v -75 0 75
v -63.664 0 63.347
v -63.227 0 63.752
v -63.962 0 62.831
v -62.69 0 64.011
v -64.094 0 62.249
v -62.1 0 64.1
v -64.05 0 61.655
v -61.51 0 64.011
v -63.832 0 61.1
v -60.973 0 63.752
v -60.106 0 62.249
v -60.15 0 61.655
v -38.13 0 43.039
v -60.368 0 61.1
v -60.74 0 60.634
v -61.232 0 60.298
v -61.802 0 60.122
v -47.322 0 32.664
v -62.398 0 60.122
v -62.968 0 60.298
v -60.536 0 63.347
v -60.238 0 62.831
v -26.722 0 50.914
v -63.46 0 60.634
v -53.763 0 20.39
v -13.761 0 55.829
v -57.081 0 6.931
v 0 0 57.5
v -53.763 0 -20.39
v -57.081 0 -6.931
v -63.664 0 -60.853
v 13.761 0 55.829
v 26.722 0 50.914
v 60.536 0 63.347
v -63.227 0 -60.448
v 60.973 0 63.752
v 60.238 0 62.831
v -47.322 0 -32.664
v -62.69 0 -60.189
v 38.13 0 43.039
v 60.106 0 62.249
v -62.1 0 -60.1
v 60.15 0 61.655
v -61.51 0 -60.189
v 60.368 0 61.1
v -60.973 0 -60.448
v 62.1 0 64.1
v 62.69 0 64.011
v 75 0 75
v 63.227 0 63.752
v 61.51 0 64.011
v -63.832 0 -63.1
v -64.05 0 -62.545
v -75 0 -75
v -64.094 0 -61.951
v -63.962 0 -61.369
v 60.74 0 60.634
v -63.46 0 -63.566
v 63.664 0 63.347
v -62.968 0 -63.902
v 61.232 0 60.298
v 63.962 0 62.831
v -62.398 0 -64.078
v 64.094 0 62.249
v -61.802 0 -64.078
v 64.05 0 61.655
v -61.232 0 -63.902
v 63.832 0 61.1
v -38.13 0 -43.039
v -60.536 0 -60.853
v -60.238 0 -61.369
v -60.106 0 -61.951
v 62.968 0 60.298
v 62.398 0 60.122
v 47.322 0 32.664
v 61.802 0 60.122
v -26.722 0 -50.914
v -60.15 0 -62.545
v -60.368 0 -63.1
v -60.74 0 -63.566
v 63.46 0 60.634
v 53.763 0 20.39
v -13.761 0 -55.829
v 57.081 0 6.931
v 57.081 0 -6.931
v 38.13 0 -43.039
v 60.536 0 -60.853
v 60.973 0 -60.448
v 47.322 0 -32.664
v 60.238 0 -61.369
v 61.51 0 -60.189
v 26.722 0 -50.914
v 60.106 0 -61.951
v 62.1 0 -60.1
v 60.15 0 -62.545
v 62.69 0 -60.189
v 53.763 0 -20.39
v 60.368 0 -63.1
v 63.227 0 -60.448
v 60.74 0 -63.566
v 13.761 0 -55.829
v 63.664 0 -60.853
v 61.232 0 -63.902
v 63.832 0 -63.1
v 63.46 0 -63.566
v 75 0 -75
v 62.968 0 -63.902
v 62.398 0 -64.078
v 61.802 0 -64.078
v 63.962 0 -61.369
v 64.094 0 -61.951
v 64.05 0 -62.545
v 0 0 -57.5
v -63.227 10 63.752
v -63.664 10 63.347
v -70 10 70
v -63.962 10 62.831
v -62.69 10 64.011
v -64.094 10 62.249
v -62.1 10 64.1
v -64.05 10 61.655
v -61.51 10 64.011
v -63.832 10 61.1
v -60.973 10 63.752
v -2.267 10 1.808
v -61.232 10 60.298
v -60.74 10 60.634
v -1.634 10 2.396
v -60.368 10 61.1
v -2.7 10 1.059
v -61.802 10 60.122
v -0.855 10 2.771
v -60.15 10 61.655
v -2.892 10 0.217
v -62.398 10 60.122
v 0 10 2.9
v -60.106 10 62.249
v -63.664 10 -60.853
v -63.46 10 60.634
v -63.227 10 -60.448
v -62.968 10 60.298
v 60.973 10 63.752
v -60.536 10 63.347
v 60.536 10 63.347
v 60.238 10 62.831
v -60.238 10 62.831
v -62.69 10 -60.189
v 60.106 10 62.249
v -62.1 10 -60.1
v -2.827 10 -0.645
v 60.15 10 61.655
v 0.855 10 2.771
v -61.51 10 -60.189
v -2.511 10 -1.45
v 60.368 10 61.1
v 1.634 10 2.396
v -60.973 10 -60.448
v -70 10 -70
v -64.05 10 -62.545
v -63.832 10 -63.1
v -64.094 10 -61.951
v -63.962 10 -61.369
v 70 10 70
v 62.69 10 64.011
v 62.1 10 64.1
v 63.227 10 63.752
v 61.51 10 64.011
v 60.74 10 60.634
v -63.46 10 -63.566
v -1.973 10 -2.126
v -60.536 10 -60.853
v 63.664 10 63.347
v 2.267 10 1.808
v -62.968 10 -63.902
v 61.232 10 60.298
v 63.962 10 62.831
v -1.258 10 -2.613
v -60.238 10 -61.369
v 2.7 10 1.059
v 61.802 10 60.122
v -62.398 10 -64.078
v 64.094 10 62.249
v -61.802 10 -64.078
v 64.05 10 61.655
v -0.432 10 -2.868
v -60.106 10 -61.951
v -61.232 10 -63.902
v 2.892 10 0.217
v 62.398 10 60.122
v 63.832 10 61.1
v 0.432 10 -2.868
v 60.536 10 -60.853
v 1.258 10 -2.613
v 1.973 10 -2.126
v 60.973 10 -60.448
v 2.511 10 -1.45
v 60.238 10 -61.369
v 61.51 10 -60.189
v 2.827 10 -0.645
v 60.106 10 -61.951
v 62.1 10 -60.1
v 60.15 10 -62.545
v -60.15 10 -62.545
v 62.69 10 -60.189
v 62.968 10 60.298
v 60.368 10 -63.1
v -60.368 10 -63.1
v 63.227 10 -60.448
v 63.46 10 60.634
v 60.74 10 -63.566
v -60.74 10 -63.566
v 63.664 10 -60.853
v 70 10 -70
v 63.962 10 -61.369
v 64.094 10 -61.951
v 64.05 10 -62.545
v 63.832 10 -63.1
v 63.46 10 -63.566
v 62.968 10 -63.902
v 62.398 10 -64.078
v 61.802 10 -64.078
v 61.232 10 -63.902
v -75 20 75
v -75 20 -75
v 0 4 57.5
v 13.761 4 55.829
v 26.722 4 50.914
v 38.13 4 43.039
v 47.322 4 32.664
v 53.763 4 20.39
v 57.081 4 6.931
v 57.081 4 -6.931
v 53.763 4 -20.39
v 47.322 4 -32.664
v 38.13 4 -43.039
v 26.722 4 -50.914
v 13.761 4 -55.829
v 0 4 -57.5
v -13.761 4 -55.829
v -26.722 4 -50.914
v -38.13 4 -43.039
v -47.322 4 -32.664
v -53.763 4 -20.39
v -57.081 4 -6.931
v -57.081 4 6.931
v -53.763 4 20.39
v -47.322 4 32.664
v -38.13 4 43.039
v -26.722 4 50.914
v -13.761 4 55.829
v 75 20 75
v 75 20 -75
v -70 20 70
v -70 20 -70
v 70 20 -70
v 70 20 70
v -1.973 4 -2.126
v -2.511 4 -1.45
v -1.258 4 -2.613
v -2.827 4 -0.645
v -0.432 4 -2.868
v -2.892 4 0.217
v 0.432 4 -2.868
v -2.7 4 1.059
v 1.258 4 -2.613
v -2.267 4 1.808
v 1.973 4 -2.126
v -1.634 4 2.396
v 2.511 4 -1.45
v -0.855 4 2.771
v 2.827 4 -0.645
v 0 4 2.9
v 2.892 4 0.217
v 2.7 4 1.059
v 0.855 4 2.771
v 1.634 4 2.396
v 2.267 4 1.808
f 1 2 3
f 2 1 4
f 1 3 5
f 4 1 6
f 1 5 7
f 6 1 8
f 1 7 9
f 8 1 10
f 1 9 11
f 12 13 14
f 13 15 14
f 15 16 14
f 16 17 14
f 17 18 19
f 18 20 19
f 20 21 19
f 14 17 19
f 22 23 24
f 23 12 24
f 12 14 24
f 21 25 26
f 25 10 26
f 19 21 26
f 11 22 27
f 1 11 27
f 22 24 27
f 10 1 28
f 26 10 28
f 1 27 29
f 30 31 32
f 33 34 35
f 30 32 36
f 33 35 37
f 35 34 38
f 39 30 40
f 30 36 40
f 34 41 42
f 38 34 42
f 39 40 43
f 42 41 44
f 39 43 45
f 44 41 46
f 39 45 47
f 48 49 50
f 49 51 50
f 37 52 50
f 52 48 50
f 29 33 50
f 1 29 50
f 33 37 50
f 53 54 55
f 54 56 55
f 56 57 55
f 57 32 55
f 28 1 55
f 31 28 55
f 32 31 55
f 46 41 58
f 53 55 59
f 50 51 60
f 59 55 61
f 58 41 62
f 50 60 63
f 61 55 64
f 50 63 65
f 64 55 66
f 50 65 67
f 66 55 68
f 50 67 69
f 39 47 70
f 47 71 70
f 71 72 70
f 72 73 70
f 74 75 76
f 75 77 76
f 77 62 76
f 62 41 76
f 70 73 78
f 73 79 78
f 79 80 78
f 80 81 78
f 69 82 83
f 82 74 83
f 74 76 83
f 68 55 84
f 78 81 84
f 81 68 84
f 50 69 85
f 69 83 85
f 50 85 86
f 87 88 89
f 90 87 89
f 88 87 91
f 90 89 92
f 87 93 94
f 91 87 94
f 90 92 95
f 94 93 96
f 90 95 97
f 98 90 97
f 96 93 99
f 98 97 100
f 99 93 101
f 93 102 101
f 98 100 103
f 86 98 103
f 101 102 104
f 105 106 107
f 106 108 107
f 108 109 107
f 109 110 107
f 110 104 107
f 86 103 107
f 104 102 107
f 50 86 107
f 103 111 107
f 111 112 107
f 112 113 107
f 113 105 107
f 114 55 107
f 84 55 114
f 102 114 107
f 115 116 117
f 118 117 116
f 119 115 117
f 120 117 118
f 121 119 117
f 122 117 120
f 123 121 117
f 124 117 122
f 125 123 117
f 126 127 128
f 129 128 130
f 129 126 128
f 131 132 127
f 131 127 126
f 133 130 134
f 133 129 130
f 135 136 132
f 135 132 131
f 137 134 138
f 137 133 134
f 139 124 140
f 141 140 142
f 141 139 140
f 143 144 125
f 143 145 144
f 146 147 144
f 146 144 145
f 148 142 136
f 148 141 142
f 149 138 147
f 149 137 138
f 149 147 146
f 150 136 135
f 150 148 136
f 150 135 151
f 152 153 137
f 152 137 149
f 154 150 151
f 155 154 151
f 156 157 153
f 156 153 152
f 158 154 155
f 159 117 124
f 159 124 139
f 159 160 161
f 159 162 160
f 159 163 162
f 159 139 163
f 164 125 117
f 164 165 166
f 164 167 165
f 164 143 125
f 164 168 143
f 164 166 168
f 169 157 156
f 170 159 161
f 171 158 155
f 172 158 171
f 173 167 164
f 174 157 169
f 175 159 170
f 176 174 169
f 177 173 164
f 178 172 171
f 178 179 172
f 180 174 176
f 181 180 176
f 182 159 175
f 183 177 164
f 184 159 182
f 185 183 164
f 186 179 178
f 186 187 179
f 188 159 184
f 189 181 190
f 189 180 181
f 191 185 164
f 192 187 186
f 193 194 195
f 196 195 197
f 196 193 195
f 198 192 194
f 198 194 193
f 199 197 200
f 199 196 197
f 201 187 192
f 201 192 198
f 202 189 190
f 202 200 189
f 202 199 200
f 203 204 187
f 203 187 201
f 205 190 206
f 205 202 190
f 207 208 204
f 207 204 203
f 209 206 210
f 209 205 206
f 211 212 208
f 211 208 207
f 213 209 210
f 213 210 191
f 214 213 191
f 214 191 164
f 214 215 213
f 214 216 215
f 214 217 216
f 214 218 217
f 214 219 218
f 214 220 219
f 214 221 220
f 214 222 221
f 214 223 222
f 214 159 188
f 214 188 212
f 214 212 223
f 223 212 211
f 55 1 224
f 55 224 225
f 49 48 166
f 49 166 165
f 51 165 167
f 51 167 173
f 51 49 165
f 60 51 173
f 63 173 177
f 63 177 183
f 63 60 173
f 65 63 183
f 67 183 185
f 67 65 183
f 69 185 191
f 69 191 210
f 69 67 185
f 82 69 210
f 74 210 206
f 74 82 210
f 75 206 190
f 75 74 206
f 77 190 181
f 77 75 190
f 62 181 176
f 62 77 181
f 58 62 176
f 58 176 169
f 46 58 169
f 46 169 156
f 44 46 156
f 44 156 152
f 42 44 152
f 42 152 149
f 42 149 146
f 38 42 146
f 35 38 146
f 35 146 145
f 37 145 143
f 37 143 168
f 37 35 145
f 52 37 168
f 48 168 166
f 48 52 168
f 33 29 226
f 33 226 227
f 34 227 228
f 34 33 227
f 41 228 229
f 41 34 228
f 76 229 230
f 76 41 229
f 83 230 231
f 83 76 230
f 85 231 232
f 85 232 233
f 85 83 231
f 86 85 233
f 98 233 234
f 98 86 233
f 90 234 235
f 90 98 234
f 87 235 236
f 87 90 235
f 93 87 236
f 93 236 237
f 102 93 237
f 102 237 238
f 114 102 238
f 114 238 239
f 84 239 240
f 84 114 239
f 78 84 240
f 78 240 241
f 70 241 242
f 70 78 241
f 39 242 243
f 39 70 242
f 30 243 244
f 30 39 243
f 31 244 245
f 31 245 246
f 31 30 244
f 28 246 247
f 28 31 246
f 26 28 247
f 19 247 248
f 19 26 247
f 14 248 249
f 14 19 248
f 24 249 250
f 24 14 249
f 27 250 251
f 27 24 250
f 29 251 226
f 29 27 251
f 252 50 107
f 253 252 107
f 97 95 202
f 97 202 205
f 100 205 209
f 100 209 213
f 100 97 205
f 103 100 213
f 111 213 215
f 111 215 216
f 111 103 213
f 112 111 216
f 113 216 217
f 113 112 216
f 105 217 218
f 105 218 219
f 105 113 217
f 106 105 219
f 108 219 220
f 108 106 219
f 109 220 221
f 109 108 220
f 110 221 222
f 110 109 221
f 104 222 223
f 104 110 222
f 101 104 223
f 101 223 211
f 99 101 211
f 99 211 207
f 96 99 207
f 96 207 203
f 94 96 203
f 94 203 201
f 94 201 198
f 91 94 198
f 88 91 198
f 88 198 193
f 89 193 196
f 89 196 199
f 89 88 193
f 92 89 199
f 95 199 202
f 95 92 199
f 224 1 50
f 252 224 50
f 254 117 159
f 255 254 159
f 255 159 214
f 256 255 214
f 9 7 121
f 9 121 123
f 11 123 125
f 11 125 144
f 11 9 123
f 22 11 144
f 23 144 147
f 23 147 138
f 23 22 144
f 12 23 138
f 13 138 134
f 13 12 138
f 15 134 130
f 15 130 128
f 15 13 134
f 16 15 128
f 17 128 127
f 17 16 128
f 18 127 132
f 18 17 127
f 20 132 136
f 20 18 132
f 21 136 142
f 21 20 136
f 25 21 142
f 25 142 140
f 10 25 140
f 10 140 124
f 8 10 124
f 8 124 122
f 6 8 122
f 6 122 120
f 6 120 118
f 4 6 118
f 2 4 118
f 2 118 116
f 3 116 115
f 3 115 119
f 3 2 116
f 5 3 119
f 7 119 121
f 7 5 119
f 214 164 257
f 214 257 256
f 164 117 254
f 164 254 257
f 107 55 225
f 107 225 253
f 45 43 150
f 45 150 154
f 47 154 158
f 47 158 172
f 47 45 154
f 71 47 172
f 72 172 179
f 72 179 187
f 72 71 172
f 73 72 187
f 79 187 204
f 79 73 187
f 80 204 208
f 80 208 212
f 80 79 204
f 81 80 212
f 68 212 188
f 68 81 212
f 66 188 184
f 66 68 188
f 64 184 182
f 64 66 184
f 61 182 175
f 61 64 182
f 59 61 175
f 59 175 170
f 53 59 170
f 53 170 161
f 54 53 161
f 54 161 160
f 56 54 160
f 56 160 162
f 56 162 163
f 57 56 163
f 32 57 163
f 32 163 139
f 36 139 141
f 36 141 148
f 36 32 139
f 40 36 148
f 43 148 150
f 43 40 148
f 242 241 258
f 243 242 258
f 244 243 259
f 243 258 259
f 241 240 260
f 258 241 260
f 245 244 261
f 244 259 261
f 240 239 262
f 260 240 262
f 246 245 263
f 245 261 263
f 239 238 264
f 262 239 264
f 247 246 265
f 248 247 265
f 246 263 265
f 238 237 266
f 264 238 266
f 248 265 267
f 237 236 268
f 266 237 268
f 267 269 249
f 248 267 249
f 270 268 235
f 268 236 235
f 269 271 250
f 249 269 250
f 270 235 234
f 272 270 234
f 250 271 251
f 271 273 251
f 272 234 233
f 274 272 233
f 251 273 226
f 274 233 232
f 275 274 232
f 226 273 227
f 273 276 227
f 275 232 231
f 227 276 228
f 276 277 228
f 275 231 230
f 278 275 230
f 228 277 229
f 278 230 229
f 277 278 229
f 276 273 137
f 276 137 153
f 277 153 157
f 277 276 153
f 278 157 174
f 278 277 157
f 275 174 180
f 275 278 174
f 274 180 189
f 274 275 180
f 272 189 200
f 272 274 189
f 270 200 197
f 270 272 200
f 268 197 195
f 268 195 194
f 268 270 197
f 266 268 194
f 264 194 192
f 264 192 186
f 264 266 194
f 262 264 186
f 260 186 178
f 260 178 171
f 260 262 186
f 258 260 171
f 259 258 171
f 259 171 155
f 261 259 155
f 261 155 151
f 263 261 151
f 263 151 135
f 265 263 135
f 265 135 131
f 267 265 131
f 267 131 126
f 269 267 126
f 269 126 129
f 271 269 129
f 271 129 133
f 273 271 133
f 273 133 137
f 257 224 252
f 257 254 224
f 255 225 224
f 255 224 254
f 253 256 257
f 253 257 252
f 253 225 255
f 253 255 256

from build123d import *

# Parameters (mm, degrees)
SKETCH1_W           = 150
SKETCH1_H           = 150
SKETCH1_W_2         = 140
SKETCH1_H_2         = 140
BOSS_EXTRUDE1_DEPTH = 20
SKETCH1_3_W         = 140
SKETCH1_3_H         = 140
SKETCH1_3_R         = 2
BOSS_EXTRUDE2_DEPTH = 10
SKETCH1_4_R         = 57.5
CUT_EXTRUDE1_DEPTH  = 4
SKETCH1_5_R         = 2.9
CUT_EXTRUDE2_DEPTH  = 10


with BuildPart() as part:
    # Sketch1 → Boss-Extrude1 (new body)
    with BuildSketch(Plane(origin=(0, 0, 0), x_dir=(1, 0, 0), z_dir=(0, 1, 0))):
        Rectangle(SKETCH1_W, SKETCH1_H)
        Rectangle(SKETCH1_W_2, SKETCH1_H_2, mode=Mode.SUBTRACT)
    extrude(amount=BOSS_EXTRUDE1_DEPTH)

    # Sketch1<3> → Boss-Extrude2 (add)
    with BuildSketch(Plane(origin=(0, 0, 0), x_dir=(1, 0, 0), z_dir=(0, 1, 0))):
        Rectangle(SKETCH1_3_W, SKETCH1_3_H)
        with Locations(Location((-62.1, -62.1, 0), (0, 0, 270))):
            Circle(SKETCH1_3_R, mode=Mode.SUBTRACT)
        with Locations(Location((62.1, -62.1, 0), (0, 0, 270))):
            Circle(SKETCH1_3_R, mode=Mode.SUBTRACT)
        with Locations(Location((-62.1, 62.1, 0), (0, 0, 270))):
            Circle(SKETCH1_3_R, mode=Mode.SUBTRACT)
        with Locations(Location((62.1, 62.1, 0), (0, 0, 270))):
            Circle(SKETCH1_3_R, mode=Mode.SUBTRACT)
    extrude(amount=BOSS_EXTRUDE2_DEPTH)

    # Sketch1<4> → Cut-Extrude1 (cut)
    with BuildSketch(Plane(origin=(0, 0, 0), x_dir=(1, 0, 0), z_dir=(0, 1, 0))):
        with Locations(Location((0, 0, 0), (0, 0, 270))):
            Circle(SKETCH1_4_R)
    extrude(amount=CUT_EXTRUDE1_DEPTH, mode=Mode.SUBTRACT)

    # Sketch1<5> → Cut-Extrude2 (cut)
    with BuildSketch(Plane(origin=(0, 0, 0), x_dir=(1, 0, 0), z_dir=(0, 1, 0))):
        with Locations(Location((0, 0, 0), (0, 0, 270))):
            Circle(SKETCH1_5_R)
    extrude(amount=CUT_EXTRUDE2_DEPTH, mode=Mode.SUBTRACT)


solid = part.part
